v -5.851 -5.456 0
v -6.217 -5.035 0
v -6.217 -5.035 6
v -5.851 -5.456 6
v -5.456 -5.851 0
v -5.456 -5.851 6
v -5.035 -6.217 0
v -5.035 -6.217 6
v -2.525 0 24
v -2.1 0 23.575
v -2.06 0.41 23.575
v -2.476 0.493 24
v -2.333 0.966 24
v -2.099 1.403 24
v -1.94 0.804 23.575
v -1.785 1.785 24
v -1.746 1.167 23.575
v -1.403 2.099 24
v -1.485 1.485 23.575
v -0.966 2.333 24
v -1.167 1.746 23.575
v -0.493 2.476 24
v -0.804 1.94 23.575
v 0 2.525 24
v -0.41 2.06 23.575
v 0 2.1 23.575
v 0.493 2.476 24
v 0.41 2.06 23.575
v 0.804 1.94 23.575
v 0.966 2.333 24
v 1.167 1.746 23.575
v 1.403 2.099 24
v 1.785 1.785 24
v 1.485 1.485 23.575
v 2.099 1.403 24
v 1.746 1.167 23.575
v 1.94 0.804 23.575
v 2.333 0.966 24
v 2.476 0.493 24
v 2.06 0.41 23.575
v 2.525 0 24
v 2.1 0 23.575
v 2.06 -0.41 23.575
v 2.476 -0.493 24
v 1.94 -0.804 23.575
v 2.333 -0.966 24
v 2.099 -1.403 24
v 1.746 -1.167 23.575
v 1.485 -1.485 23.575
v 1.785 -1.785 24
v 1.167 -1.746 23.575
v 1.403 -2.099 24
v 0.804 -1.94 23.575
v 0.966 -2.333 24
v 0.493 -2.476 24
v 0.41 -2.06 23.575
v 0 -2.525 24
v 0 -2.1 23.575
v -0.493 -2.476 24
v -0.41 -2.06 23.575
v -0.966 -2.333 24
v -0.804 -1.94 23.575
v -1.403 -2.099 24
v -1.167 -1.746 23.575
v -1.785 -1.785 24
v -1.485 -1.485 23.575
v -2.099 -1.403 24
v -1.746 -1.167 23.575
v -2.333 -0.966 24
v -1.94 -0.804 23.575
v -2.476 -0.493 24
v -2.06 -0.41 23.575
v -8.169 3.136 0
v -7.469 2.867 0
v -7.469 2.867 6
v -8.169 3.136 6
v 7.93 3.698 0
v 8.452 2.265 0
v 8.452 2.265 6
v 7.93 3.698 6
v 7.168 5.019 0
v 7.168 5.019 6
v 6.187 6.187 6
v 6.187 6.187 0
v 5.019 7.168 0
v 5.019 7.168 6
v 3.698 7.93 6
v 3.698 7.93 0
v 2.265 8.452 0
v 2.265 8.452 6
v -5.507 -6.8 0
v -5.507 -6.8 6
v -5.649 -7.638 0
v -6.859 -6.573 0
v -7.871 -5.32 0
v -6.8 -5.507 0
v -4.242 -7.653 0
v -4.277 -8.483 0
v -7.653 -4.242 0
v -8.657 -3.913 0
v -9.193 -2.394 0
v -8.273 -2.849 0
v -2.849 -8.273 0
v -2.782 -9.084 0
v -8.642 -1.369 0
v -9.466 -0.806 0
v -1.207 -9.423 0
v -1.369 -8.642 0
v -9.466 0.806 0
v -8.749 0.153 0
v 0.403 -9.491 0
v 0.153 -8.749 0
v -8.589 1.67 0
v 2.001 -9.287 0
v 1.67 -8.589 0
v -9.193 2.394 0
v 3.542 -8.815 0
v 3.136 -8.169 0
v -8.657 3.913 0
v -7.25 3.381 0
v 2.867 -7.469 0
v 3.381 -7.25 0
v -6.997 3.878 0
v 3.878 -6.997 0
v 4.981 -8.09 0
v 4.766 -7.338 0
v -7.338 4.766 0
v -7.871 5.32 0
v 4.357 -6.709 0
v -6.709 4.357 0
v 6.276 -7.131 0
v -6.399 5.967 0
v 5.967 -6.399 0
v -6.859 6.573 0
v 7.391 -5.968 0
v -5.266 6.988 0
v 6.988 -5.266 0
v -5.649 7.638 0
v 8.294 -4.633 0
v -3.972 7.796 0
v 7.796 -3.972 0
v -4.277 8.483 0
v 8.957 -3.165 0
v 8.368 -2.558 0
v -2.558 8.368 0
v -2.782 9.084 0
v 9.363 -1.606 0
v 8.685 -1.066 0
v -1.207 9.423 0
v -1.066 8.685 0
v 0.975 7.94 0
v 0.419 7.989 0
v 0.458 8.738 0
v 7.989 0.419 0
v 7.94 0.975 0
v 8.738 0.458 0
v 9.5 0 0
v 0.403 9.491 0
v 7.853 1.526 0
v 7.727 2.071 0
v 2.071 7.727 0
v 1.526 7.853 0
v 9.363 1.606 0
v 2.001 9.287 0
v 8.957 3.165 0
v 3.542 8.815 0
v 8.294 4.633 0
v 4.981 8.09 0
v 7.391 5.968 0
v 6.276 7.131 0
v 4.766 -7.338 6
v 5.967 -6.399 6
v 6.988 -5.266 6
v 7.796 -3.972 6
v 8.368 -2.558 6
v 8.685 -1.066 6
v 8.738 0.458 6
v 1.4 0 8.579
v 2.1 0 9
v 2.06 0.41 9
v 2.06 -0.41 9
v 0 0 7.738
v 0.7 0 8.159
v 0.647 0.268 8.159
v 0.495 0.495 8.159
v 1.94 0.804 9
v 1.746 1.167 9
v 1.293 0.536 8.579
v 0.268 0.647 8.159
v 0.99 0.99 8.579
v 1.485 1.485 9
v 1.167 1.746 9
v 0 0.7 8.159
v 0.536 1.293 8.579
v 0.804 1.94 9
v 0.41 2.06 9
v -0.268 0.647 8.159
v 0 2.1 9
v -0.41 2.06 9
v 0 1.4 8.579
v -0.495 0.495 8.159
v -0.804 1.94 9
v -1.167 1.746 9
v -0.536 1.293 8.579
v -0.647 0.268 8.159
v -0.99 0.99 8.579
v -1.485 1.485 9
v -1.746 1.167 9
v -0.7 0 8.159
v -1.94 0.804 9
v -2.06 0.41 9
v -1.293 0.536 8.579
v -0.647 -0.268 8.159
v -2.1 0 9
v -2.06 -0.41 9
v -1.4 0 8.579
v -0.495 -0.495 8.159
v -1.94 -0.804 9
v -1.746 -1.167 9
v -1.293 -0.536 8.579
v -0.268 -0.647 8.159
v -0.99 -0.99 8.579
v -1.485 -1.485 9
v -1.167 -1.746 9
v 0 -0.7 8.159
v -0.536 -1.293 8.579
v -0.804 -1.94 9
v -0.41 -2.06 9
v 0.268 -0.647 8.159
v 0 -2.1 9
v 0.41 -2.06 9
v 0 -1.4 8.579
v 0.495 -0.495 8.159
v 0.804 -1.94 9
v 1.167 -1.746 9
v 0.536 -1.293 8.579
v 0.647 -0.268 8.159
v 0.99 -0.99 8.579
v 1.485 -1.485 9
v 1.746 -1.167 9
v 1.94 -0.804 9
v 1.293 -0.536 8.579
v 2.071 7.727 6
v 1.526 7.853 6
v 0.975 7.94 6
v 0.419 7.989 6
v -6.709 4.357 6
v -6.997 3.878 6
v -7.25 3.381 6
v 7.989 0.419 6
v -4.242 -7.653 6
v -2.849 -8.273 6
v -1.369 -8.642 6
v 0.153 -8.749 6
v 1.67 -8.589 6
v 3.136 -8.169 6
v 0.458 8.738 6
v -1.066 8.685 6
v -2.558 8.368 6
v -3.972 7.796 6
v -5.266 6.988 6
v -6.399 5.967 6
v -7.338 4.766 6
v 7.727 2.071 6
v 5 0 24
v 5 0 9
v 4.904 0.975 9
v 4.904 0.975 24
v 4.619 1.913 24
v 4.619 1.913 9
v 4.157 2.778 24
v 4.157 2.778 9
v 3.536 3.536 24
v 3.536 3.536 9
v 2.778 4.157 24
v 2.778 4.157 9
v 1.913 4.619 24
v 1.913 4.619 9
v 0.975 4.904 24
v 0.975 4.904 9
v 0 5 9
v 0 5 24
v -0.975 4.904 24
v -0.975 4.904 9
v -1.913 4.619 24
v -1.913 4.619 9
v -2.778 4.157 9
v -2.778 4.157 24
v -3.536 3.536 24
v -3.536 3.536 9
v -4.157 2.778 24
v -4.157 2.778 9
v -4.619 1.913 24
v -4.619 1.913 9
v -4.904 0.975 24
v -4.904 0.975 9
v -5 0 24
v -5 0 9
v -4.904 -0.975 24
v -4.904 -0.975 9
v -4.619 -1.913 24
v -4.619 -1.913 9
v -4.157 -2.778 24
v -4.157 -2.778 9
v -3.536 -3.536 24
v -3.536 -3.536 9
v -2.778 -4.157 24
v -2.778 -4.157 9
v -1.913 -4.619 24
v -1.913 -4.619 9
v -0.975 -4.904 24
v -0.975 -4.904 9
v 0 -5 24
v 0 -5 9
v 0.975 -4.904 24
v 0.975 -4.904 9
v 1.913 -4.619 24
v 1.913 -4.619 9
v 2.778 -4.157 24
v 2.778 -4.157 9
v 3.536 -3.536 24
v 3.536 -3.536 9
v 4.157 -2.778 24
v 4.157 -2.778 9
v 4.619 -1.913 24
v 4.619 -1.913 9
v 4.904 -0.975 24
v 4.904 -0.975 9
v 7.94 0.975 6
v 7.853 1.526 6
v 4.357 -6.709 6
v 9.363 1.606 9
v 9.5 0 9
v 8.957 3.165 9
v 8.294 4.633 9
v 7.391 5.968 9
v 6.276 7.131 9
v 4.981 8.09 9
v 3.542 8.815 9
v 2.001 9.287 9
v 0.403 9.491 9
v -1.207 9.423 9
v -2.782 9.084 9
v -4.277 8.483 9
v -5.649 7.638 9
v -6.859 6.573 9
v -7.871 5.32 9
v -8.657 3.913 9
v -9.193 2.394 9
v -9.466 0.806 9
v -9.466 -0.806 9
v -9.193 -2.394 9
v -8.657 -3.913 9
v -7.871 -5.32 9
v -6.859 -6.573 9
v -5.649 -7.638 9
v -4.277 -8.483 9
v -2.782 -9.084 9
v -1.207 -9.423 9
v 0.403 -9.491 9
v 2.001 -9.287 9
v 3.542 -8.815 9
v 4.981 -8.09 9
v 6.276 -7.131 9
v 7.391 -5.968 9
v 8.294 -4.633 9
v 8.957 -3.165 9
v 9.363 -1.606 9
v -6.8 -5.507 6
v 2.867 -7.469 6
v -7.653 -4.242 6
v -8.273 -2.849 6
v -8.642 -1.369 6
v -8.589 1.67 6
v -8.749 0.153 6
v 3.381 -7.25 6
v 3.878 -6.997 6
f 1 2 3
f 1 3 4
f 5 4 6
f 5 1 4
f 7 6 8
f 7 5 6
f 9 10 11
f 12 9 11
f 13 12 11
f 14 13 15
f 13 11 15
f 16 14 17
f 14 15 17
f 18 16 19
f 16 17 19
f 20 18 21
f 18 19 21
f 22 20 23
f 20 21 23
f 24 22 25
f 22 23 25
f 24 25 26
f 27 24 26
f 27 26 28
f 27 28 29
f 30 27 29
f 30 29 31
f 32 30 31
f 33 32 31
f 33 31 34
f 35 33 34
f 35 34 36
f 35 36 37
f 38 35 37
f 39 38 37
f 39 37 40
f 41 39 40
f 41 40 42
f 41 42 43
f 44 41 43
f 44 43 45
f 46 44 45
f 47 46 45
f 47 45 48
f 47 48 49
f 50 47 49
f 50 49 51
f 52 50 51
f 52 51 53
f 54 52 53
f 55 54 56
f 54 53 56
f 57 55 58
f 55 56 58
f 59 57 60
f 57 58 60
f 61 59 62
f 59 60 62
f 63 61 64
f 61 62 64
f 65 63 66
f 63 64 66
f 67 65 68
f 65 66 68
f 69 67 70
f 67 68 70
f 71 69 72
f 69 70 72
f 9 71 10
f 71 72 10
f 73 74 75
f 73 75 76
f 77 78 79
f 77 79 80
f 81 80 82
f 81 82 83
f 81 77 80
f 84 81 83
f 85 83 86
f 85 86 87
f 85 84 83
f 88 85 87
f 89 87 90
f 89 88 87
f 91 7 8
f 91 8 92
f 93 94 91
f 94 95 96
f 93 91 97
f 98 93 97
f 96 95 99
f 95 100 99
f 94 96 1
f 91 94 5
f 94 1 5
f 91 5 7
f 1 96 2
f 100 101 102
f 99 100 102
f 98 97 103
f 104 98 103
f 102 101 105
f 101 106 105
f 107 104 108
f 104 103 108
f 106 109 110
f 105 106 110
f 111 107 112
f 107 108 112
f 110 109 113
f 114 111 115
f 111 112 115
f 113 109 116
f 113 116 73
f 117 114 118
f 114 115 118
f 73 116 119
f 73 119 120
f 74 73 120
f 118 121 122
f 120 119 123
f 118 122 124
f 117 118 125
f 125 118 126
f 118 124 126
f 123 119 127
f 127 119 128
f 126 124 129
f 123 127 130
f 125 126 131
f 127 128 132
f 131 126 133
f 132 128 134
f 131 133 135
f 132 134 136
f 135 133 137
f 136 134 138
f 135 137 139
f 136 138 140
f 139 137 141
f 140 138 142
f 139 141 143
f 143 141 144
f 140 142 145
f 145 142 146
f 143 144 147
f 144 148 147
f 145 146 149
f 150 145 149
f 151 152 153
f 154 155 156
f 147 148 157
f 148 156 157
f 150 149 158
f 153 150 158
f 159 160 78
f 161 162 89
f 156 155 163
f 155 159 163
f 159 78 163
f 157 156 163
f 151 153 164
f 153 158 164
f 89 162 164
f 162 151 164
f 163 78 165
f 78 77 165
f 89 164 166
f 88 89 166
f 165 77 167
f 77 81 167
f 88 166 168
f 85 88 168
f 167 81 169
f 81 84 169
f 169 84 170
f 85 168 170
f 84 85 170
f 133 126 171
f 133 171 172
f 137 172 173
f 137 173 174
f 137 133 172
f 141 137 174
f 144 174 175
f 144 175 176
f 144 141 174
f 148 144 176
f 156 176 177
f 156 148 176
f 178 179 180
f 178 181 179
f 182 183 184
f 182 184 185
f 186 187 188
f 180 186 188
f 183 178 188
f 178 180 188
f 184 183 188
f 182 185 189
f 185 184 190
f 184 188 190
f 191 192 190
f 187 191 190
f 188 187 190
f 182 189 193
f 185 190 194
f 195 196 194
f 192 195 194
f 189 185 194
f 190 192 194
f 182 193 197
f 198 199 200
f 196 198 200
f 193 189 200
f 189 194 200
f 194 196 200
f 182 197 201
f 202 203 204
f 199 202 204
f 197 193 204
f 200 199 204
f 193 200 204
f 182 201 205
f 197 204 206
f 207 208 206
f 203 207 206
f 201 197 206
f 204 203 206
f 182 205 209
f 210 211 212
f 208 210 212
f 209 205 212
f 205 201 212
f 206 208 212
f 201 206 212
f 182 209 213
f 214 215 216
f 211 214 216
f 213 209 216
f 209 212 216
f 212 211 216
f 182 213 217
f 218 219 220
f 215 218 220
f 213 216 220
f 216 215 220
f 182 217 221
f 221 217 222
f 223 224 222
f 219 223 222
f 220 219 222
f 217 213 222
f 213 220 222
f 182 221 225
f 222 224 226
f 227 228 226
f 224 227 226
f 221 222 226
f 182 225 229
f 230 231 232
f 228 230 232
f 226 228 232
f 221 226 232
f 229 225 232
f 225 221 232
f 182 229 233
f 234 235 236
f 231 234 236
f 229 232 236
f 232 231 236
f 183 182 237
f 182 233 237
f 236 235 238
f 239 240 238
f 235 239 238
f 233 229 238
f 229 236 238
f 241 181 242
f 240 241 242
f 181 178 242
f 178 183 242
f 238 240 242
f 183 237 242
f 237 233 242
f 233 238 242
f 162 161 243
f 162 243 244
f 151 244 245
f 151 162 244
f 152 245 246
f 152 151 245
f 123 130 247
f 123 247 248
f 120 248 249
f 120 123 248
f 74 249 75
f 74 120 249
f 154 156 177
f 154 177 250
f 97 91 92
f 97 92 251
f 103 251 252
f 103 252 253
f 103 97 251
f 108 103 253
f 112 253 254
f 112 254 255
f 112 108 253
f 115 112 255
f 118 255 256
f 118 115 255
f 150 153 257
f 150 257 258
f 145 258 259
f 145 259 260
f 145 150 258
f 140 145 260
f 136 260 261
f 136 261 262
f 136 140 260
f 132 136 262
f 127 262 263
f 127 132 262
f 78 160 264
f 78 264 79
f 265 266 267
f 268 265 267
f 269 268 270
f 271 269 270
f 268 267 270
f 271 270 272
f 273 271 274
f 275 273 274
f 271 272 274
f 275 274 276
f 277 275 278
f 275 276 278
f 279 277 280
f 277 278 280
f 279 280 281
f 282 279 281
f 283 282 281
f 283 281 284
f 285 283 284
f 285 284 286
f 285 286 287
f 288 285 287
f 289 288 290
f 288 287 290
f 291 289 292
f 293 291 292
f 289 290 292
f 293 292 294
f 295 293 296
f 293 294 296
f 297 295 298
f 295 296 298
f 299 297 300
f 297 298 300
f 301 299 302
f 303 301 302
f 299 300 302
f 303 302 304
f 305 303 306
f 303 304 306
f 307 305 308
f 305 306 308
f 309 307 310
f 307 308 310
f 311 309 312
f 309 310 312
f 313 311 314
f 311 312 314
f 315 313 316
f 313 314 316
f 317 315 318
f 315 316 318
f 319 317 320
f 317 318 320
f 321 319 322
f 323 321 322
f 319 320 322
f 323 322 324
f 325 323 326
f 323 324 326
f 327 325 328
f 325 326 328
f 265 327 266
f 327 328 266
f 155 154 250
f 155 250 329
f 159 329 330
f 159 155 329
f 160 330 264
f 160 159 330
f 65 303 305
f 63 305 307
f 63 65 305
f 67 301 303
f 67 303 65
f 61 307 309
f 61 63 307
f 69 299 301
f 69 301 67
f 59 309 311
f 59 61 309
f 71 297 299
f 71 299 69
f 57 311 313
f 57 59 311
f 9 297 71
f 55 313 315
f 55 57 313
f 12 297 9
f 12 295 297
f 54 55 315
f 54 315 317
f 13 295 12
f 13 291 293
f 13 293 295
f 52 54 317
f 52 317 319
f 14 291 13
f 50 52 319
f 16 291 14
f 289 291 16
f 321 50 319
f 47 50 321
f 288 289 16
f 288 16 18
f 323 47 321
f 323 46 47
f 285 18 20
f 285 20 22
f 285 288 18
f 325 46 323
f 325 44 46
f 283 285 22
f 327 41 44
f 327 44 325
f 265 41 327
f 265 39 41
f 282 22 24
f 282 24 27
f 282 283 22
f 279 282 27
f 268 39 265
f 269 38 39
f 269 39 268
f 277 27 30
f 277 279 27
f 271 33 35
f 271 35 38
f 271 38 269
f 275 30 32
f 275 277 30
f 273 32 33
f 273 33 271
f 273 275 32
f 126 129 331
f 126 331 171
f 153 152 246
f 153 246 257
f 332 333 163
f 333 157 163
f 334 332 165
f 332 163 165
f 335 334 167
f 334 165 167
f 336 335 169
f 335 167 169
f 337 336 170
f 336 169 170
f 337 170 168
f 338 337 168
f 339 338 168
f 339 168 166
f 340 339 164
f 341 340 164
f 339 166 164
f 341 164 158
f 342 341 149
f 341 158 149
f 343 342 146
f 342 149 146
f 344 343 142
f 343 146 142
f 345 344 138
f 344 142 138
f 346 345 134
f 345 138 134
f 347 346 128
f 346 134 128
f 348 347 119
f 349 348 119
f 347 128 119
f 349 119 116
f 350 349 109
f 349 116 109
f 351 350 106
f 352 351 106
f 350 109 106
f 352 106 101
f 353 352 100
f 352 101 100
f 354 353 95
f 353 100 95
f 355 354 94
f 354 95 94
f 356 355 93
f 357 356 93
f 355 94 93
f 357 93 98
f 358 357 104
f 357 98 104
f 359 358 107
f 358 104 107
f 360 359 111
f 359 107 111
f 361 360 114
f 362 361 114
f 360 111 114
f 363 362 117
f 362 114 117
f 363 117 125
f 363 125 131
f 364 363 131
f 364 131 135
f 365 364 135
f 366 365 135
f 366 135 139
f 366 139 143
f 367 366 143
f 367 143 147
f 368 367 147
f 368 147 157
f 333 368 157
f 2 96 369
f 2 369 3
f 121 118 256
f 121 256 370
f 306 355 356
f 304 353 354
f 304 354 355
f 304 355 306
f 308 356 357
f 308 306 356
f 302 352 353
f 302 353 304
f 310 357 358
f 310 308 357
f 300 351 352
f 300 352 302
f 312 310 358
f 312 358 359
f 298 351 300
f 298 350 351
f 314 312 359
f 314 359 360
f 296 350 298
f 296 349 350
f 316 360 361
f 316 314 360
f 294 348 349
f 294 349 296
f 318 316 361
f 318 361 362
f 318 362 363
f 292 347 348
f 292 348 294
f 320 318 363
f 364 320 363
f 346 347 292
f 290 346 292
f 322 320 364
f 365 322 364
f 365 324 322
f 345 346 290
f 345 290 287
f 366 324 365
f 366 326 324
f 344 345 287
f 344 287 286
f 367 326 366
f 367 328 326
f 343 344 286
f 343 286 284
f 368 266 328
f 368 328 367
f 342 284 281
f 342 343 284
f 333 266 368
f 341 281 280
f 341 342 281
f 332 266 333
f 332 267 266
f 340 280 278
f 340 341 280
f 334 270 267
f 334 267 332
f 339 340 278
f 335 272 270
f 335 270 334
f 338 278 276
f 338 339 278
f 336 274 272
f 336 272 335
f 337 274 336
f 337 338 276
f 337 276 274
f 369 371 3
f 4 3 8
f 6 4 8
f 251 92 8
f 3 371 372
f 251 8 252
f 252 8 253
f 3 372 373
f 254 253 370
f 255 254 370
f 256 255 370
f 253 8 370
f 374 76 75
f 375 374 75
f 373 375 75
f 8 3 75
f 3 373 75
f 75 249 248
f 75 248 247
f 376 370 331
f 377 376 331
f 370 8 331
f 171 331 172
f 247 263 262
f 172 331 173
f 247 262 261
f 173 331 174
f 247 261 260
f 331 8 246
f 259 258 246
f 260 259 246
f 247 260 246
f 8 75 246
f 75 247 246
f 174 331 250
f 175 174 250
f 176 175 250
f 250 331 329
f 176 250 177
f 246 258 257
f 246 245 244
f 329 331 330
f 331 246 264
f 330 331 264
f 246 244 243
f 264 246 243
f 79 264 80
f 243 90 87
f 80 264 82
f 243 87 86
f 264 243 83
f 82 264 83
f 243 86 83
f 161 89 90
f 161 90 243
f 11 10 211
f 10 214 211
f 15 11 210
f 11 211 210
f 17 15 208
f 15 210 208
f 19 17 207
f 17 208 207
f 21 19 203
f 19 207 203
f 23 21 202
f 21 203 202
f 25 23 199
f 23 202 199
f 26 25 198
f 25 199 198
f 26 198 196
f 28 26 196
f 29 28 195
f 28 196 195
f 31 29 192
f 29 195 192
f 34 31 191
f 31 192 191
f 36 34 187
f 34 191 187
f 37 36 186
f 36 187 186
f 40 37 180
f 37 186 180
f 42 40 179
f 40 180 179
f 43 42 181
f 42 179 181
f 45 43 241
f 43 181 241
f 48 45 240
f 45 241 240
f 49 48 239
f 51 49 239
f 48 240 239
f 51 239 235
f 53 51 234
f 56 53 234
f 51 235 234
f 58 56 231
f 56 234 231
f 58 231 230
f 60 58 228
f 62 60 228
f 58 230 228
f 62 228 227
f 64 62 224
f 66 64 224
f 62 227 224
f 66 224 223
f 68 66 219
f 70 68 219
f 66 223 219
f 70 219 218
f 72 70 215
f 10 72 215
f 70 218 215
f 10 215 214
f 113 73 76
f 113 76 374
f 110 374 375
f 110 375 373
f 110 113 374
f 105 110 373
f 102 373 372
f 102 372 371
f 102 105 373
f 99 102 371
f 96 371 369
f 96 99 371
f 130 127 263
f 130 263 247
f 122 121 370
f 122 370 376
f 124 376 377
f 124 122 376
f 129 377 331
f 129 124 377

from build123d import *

# Parameters (mm, degrees)
SKETCH1_R                   = 9.5
SKETCH1_R_2                 = 8
BOSS_EXTRUDE1_DEPTH         = 6
SKETCH2_R                   = 9.5
BOSS_EXTRUDE2_DEPTH         = 3
SKETCH3_R                   = 5
BOSS_EXTRUDE3_DEPTH         = 15
CUT_EXTRUDE1_DEPTH          = 6
CIRPATTERN1_COUNT           = 5
M5_TAPPED_HOLE1_D           = 4.2
M5_TAPPED_HOLE1_DEPTH       = 15
M5_TAPPED_HOLE1_CSINK_D     = 5.05
M5_TAPPED_HOLE1_CSINK_ANGLE = 90
M5_TAPPED_HOLE1_TIP         = 1.2618073


with BuildPart() as part:
    # Sketch1 → Boss-Extrude1 (new body)
    with BuildSketch(Plane.XY):
        Circle(SKETCH1_R)
        Circle(SKETCH1_R_2, mode=Mode.SUBTRACT)
    extrude(amount=BOSS_EXTRUDE1_DEPTH)

    # Sketch2 → Boss-Extrude2 (add)
    with BuildSketch(Plane.XY.offset(6)):
        Circle(SKETCH2_R)
    extrude(amount=BOSS_EXTRUDE2_DEPTH)

    # Sketch3 → Boss-Extrude3 (add)
    with BuildSketch(Plane.XY.offset(9)):
        Circle(SKETCH3_R)
    extrude(amount=BOSS_EXTRUDE3_DEPTH)

    # Sketch4 → Cut-Extrude1 (cut)
    with BuildSketch(Plane(origin=(0, 0, 0), x_dir=(-1, 0, 0), z_dir=(0, 0, -1))):
        with BuildLine():
            Line((-7.72740661, 2.070552361), (-8.45185098, 2.264666645))
            ThreePointArc((-8.45185098, 2.264666645), (-6.187184335, 6.187184335), (-2.264666645, 8.45185098))
            Line((-2.264666645, 8.45185098), (-2.070552361, 7.72740661))
            ThreePointArc((-2.070552361, 7.72740661), (-5.656854249, 5.656854249), (-7.72740661, 2.070552361))
        make_face()
    cut_extrude1 = extrude(amount=-CUT_EXTRUDE1_DEPTH, mode=Mode.SUBTRACT)

    # CirPattern1: Cut-Extrude1 ×5 about axis
    cirpattern1_axis = Axis((0, 0, 0), (0, 0, 1))
    for i in range(1, CIRPATTERN1_COUNT):
        add(cut_extrude1.rotate(cirpattern1_axis, i * 360 / CIRPATTERN1_COUNT), mode=Mode.SUBTRACT)

    # M5 Tapped Hole1
    with Locations(Plane.XY.offset(24)):
        with Locations((0, 0)):
            CounterSinkHole(M5_TAPPED_HOLE1_D / 2, M5_TAPPED_HOLE1_CSINK_D / 2, depth=M5_TAPPED_HOLE1_DEPTH, counter_sink_angle=M5_TAPPED_HOLE1_CSINK_ANGLE)
            with Locations((0, 0, -(M5_TAPPED_HOLE1_DEPTH + M5_TAPPED_HOLE1_TIP / 2))):  # 118° drill point
                Cone(0, M5_TAPPED_HOLE1_D / 2, M5_TAPPED_HOLE1_TIP, mode=Mode.SUBTRACT)


solid = part.part
